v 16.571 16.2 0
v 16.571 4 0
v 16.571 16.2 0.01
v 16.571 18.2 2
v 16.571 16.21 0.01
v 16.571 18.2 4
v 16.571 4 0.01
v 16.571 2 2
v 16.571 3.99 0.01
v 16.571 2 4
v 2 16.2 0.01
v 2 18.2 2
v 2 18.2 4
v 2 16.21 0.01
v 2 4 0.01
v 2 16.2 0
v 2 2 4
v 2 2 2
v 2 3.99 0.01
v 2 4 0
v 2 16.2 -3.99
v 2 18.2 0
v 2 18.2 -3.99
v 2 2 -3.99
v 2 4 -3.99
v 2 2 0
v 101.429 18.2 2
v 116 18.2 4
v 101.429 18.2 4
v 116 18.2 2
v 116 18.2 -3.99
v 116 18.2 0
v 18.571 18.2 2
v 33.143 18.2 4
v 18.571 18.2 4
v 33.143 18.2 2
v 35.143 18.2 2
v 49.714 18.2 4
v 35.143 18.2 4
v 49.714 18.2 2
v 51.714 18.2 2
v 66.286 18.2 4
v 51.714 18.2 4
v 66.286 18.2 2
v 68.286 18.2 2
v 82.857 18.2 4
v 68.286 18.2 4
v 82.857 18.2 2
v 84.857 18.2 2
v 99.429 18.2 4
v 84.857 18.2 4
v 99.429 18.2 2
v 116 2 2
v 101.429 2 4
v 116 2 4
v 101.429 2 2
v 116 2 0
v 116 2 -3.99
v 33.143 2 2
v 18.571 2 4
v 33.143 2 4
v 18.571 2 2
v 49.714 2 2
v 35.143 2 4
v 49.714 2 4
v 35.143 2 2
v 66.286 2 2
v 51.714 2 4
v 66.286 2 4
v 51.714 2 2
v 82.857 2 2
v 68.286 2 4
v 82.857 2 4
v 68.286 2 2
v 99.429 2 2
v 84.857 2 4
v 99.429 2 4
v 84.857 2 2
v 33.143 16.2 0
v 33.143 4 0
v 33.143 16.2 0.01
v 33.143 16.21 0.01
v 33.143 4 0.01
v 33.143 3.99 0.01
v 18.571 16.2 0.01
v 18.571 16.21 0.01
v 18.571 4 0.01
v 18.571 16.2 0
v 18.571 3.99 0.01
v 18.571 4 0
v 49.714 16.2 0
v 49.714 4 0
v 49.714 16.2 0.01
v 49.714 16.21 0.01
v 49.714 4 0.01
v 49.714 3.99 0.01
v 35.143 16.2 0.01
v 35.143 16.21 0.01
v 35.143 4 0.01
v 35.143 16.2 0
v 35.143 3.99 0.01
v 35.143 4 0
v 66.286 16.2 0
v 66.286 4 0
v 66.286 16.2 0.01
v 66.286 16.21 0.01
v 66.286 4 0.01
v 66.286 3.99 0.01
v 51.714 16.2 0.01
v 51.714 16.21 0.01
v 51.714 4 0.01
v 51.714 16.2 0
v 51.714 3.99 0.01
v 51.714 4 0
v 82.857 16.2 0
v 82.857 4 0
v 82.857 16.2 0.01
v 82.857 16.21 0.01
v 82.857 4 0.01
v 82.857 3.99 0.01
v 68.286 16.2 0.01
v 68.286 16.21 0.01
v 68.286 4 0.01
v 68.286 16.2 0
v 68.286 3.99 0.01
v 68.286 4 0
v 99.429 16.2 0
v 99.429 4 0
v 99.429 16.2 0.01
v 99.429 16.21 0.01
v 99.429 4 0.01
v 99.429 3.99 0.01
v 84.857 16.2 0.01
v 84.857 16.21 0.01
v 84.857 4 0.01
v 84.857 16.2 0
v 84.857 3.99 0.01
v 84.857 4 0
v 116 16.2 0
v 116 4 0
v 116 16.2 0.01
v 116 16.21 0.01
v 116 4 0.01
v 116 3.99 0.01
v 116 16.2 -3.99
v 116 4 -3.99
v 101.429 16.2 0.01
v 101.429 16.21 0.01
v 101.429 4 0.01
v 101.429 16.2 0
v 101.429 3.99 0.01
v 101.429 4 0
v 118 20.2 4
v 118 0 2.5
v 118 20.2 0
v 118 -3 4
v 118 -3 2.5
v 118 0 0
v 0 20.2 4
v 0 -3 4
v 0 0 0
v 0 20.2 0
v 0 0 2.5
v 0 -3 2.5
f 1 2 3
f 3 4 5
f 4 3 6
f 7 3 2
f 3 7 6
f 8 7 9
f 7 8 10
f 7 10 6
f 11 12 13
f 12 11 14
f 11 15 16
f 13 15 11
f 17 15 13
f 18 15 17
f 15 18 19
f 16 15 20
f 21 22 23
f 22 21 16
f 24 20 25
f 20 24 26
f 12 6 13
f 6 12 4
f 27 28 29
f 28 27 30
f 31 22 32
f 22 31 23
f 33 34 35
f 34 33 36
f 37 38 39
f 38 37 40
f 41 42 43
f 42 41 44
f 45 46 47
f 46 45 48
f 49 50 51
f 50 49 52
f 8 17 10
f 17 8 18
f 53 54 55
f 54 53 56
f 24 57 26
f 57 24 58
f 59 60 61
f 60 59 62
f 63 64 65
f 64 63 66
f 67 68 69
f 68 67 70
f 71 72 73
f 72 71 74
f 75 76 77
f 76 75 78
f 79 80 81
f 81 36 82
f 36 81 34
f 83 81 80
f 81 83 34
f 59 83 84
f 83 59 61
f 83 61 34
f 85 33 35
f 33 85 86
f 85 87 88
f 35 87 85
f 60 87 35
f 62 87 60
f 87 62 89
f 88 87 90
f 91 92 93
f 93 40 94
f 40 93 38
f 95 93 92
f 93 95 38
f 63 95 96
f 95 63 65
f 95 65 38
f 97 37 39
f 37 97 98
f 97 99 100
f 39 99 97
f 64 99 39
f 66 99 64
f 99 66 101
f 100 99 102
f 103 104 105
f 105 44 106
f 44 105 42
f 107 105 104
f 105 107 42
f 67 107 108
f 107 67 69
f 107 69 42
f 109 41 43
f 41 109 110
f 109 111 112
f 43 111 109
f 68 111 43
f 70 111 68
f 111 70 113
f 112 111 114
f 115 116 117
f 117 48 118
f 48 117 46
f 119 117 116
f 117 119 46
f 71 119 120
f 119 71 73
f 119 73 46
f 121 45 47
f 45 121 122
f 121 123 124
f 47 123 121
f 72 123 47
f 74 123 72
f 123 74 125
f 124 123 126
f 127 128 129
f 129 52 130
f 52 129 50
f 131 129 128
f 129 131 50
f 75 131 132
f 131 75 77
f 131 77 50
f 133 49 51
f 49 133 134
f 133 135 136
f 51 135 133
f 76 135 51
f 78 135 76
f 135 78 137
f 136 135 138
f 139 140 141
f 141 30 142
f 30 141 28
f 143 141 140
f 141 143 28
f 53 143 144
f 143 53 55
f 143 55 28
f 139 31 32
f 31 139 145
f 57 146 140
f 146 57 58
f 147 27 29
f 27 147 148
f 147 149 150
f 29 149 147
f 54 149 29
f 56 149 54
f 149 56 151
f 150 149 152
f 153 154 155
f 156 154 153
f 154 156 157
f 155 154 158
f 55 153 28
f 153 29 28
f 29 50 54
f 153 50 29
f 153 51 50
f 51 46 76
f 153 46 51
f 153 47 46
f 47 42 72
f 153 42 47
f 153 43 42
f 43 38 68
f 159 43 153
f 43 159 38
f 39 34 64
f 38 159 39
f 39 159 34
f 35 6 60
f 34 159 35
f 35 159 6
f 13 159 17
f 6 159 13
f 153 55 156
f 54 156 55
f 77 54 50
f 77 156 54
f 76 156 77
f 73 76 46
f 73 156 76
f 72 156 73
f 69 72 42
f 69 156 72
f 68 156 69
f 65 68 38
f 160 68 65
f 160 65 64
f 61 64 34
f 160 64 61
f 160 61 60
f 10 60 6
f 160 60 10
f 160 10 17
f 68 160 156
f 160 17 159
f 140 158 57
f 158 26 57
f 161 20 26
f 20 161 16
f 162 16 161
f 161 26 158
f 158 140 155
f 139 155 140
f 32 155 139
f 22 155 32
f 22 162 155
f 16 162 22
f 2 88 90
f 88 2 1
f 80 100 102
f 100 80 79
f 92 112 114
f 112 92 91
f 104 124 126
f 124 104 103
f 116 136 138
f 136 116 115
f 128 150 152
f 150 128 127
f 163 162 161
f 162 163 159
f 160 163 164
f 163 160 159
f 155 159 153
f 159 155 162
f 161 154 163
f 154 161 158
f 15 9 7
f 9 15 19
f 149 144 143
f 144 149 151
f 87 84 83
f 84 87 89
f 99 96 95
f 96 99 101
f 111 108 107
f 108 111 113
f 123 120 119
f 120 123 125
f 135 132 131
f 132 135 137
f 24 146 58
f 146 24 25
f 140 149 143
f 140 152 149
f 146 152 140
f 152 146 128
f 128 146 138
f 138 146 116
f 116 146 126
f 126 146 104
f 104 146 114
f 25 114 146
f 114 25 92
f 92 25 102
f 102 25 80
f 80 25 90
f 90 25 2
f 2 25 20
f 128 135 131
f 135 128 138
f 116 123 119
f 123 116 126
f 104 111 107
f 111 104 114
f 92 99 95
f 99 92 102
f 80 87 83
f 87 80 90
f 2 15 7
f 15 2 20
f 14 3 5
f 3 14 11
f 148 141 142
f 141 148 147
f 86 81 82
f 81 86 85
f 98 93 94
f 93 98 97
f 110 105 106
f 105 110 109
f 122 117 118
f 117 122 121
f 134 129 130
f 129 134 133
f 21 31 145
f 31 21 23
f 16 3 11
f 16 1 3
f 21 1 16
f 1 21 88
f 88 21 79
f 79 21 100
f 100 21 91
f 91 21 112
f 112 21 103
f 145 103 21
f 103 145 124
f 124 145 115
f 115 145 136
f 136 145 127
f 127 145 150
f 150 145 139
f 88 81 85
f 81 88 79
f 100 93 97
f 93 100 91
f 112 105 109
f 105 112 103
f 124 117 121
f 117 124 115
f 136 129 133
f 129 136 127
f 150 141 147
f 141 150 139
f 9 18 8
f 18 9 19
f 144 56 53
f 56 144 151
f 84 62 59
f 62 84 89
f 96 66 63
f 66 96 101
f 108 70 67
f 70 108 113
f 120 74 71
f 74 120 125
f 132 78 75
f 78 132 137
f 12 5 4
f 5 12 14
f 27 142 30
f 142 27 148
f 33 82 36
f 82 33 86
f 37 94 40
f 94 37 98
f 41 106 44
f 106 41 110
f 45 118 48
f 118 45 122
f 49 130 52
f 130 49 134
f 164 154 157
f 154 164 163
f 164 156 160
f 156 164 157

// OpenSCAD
strip_w = 12.2;
strip_d = 116/7;
nled    = 7;
d       = 2;
h       = 4;
d_cover = 4;
h_back  = 4;
d_card  = 2.5;

inside  = [strip_d*nled, strip_w+2*d];
outside = [inside[0]+1*d, inside[1]+2*d, h];

show_box   = true;
show_cover = false;

// ==================================================
// BOX

if (show_box) {
  difference() {
    cube(outside);
    // holes
    for (i = [1:nled]) {
      translate([d+(i-1)*strip_d, d, -h/2])
        cube([strip_d - d, inside[1], h*2]);
    }
  }
  // flanges at back
  translate([d, +d, -h_back+0.01])
    cube([inside[0]-d, d, h_back]);
  translate([d, outside[1]-2*d, -h_back+0.01])
    cube([inside[0]-d, d, h_back]);
  // sloped tops of flanges
  translate([d, 2*d, 0])
    rotate([180, 0, 0])
    rotate([0, 90, 0])
    linear_extrude(inside[0]-d)
    polygon(points = [[0, 0], [0, d], [d, d]]);
  translate([d, outside[1]-2*d, 0])
    mirror([0, 1, 0])
    rotate([180, 0, 0])
    rotate([0, 90, 0])
    linear_extrude(inside[0]-d)
    polygon(points = [[0, 0], [0, d], [d, d]]);
}


translate([0, -3, d_card])
cube([outside[0], 3, outside[2]-d_card]);





// ==================================================
// COVER
cover = [outside[0], outside[1], d_cover];


if (show_cover) {
  translate([0, 0, h+2])
    difference() {
      cube(cover);
      // holes at bottom of cover
      for (i = [0:nled]) {
        translate([i*strip_d-0.05, -outside[1]*0.5, -0.01])
          cube([d+0.1, outside[1]*2, d_cover*0.5]); 
      }
      // slits at top of cover
      for (i = [1:(nled-1)]) {
        translate([i*strip_d, -outside[1]*0.5, d_cover])
          translate([d/2, 0, d_cover*0.25-d_cover/5])
          rotate([0, 45, 0])
          translate([-d/2, 0, -d_cover*0.25])
          cube([d, outside[1]*2, d_cover*0.5]);
      }

      translate([-outside[0]/2, -0.05, -0.01])
        cube([outside[0]*2, d+0.1, d_cover*0.5]);
      translate([-outside[0]/2, outside[1]-d-0.05, -0.01])
        cube([outside[0]*2, d+0.1, d_cover*0.5]);
    }
  }  
  

//// ==================================================
//// BOX
//difference() {
//  union() {
//    cube(outside);
//    // flanges at back
//    translate([0, -d*2, -d])
//      cube([outside[0], d*3, d]);
//    translate([0, outside[1]-d, -d])
//      cube([outside[0], d*3, d]);
//  }
//  // holes
//  for (i = [1:nled]) {
//    translate([d+(i-1)*strip_d, d, -h/2])
//      cube([strip_d - d, strip_w, h*2]);
//  }
//}
//
//// ==================================================
//// COVER
//cover = [outside[0], outside[1], d_cover];
//translate([0, 0, h+2])
//  difference() {
//    cube(cover);
//    // holes at bottom of cover
//    for (i = [0:nled]) {
//      translate([i*strip_d-0.05, -outside[1]*0.5, -0.01])
//        cube([d+0.1, outside[1]*2, d_cover*0.5]); 
//    }
//    // slits at top of cover
//    for (i = [1:(nled-1)]) {
//      translate([i*strip_d, -outside[1]*0.5, d_cover])
//        translate([d/2, 0, d_cover*0.25-d_cover/5])
//        rotate([0, 45, 0])
//        translate([-d/2, 0, -d_cover*0.25])
//        cube([d, outside[1]*2, d_cover*0.5]);
//    }
//
//    translate([-outside[0]/2, -0.05, -0.01])
//      cube([outside[0]*2, d+0.1, d_cover*0.5]);
//    translate([-outside[0]/2, outside[1]-d-0.05, -0.01])
//      cube([outside[0]*2, d+0.1, d_cover*0.5]);
//  }
